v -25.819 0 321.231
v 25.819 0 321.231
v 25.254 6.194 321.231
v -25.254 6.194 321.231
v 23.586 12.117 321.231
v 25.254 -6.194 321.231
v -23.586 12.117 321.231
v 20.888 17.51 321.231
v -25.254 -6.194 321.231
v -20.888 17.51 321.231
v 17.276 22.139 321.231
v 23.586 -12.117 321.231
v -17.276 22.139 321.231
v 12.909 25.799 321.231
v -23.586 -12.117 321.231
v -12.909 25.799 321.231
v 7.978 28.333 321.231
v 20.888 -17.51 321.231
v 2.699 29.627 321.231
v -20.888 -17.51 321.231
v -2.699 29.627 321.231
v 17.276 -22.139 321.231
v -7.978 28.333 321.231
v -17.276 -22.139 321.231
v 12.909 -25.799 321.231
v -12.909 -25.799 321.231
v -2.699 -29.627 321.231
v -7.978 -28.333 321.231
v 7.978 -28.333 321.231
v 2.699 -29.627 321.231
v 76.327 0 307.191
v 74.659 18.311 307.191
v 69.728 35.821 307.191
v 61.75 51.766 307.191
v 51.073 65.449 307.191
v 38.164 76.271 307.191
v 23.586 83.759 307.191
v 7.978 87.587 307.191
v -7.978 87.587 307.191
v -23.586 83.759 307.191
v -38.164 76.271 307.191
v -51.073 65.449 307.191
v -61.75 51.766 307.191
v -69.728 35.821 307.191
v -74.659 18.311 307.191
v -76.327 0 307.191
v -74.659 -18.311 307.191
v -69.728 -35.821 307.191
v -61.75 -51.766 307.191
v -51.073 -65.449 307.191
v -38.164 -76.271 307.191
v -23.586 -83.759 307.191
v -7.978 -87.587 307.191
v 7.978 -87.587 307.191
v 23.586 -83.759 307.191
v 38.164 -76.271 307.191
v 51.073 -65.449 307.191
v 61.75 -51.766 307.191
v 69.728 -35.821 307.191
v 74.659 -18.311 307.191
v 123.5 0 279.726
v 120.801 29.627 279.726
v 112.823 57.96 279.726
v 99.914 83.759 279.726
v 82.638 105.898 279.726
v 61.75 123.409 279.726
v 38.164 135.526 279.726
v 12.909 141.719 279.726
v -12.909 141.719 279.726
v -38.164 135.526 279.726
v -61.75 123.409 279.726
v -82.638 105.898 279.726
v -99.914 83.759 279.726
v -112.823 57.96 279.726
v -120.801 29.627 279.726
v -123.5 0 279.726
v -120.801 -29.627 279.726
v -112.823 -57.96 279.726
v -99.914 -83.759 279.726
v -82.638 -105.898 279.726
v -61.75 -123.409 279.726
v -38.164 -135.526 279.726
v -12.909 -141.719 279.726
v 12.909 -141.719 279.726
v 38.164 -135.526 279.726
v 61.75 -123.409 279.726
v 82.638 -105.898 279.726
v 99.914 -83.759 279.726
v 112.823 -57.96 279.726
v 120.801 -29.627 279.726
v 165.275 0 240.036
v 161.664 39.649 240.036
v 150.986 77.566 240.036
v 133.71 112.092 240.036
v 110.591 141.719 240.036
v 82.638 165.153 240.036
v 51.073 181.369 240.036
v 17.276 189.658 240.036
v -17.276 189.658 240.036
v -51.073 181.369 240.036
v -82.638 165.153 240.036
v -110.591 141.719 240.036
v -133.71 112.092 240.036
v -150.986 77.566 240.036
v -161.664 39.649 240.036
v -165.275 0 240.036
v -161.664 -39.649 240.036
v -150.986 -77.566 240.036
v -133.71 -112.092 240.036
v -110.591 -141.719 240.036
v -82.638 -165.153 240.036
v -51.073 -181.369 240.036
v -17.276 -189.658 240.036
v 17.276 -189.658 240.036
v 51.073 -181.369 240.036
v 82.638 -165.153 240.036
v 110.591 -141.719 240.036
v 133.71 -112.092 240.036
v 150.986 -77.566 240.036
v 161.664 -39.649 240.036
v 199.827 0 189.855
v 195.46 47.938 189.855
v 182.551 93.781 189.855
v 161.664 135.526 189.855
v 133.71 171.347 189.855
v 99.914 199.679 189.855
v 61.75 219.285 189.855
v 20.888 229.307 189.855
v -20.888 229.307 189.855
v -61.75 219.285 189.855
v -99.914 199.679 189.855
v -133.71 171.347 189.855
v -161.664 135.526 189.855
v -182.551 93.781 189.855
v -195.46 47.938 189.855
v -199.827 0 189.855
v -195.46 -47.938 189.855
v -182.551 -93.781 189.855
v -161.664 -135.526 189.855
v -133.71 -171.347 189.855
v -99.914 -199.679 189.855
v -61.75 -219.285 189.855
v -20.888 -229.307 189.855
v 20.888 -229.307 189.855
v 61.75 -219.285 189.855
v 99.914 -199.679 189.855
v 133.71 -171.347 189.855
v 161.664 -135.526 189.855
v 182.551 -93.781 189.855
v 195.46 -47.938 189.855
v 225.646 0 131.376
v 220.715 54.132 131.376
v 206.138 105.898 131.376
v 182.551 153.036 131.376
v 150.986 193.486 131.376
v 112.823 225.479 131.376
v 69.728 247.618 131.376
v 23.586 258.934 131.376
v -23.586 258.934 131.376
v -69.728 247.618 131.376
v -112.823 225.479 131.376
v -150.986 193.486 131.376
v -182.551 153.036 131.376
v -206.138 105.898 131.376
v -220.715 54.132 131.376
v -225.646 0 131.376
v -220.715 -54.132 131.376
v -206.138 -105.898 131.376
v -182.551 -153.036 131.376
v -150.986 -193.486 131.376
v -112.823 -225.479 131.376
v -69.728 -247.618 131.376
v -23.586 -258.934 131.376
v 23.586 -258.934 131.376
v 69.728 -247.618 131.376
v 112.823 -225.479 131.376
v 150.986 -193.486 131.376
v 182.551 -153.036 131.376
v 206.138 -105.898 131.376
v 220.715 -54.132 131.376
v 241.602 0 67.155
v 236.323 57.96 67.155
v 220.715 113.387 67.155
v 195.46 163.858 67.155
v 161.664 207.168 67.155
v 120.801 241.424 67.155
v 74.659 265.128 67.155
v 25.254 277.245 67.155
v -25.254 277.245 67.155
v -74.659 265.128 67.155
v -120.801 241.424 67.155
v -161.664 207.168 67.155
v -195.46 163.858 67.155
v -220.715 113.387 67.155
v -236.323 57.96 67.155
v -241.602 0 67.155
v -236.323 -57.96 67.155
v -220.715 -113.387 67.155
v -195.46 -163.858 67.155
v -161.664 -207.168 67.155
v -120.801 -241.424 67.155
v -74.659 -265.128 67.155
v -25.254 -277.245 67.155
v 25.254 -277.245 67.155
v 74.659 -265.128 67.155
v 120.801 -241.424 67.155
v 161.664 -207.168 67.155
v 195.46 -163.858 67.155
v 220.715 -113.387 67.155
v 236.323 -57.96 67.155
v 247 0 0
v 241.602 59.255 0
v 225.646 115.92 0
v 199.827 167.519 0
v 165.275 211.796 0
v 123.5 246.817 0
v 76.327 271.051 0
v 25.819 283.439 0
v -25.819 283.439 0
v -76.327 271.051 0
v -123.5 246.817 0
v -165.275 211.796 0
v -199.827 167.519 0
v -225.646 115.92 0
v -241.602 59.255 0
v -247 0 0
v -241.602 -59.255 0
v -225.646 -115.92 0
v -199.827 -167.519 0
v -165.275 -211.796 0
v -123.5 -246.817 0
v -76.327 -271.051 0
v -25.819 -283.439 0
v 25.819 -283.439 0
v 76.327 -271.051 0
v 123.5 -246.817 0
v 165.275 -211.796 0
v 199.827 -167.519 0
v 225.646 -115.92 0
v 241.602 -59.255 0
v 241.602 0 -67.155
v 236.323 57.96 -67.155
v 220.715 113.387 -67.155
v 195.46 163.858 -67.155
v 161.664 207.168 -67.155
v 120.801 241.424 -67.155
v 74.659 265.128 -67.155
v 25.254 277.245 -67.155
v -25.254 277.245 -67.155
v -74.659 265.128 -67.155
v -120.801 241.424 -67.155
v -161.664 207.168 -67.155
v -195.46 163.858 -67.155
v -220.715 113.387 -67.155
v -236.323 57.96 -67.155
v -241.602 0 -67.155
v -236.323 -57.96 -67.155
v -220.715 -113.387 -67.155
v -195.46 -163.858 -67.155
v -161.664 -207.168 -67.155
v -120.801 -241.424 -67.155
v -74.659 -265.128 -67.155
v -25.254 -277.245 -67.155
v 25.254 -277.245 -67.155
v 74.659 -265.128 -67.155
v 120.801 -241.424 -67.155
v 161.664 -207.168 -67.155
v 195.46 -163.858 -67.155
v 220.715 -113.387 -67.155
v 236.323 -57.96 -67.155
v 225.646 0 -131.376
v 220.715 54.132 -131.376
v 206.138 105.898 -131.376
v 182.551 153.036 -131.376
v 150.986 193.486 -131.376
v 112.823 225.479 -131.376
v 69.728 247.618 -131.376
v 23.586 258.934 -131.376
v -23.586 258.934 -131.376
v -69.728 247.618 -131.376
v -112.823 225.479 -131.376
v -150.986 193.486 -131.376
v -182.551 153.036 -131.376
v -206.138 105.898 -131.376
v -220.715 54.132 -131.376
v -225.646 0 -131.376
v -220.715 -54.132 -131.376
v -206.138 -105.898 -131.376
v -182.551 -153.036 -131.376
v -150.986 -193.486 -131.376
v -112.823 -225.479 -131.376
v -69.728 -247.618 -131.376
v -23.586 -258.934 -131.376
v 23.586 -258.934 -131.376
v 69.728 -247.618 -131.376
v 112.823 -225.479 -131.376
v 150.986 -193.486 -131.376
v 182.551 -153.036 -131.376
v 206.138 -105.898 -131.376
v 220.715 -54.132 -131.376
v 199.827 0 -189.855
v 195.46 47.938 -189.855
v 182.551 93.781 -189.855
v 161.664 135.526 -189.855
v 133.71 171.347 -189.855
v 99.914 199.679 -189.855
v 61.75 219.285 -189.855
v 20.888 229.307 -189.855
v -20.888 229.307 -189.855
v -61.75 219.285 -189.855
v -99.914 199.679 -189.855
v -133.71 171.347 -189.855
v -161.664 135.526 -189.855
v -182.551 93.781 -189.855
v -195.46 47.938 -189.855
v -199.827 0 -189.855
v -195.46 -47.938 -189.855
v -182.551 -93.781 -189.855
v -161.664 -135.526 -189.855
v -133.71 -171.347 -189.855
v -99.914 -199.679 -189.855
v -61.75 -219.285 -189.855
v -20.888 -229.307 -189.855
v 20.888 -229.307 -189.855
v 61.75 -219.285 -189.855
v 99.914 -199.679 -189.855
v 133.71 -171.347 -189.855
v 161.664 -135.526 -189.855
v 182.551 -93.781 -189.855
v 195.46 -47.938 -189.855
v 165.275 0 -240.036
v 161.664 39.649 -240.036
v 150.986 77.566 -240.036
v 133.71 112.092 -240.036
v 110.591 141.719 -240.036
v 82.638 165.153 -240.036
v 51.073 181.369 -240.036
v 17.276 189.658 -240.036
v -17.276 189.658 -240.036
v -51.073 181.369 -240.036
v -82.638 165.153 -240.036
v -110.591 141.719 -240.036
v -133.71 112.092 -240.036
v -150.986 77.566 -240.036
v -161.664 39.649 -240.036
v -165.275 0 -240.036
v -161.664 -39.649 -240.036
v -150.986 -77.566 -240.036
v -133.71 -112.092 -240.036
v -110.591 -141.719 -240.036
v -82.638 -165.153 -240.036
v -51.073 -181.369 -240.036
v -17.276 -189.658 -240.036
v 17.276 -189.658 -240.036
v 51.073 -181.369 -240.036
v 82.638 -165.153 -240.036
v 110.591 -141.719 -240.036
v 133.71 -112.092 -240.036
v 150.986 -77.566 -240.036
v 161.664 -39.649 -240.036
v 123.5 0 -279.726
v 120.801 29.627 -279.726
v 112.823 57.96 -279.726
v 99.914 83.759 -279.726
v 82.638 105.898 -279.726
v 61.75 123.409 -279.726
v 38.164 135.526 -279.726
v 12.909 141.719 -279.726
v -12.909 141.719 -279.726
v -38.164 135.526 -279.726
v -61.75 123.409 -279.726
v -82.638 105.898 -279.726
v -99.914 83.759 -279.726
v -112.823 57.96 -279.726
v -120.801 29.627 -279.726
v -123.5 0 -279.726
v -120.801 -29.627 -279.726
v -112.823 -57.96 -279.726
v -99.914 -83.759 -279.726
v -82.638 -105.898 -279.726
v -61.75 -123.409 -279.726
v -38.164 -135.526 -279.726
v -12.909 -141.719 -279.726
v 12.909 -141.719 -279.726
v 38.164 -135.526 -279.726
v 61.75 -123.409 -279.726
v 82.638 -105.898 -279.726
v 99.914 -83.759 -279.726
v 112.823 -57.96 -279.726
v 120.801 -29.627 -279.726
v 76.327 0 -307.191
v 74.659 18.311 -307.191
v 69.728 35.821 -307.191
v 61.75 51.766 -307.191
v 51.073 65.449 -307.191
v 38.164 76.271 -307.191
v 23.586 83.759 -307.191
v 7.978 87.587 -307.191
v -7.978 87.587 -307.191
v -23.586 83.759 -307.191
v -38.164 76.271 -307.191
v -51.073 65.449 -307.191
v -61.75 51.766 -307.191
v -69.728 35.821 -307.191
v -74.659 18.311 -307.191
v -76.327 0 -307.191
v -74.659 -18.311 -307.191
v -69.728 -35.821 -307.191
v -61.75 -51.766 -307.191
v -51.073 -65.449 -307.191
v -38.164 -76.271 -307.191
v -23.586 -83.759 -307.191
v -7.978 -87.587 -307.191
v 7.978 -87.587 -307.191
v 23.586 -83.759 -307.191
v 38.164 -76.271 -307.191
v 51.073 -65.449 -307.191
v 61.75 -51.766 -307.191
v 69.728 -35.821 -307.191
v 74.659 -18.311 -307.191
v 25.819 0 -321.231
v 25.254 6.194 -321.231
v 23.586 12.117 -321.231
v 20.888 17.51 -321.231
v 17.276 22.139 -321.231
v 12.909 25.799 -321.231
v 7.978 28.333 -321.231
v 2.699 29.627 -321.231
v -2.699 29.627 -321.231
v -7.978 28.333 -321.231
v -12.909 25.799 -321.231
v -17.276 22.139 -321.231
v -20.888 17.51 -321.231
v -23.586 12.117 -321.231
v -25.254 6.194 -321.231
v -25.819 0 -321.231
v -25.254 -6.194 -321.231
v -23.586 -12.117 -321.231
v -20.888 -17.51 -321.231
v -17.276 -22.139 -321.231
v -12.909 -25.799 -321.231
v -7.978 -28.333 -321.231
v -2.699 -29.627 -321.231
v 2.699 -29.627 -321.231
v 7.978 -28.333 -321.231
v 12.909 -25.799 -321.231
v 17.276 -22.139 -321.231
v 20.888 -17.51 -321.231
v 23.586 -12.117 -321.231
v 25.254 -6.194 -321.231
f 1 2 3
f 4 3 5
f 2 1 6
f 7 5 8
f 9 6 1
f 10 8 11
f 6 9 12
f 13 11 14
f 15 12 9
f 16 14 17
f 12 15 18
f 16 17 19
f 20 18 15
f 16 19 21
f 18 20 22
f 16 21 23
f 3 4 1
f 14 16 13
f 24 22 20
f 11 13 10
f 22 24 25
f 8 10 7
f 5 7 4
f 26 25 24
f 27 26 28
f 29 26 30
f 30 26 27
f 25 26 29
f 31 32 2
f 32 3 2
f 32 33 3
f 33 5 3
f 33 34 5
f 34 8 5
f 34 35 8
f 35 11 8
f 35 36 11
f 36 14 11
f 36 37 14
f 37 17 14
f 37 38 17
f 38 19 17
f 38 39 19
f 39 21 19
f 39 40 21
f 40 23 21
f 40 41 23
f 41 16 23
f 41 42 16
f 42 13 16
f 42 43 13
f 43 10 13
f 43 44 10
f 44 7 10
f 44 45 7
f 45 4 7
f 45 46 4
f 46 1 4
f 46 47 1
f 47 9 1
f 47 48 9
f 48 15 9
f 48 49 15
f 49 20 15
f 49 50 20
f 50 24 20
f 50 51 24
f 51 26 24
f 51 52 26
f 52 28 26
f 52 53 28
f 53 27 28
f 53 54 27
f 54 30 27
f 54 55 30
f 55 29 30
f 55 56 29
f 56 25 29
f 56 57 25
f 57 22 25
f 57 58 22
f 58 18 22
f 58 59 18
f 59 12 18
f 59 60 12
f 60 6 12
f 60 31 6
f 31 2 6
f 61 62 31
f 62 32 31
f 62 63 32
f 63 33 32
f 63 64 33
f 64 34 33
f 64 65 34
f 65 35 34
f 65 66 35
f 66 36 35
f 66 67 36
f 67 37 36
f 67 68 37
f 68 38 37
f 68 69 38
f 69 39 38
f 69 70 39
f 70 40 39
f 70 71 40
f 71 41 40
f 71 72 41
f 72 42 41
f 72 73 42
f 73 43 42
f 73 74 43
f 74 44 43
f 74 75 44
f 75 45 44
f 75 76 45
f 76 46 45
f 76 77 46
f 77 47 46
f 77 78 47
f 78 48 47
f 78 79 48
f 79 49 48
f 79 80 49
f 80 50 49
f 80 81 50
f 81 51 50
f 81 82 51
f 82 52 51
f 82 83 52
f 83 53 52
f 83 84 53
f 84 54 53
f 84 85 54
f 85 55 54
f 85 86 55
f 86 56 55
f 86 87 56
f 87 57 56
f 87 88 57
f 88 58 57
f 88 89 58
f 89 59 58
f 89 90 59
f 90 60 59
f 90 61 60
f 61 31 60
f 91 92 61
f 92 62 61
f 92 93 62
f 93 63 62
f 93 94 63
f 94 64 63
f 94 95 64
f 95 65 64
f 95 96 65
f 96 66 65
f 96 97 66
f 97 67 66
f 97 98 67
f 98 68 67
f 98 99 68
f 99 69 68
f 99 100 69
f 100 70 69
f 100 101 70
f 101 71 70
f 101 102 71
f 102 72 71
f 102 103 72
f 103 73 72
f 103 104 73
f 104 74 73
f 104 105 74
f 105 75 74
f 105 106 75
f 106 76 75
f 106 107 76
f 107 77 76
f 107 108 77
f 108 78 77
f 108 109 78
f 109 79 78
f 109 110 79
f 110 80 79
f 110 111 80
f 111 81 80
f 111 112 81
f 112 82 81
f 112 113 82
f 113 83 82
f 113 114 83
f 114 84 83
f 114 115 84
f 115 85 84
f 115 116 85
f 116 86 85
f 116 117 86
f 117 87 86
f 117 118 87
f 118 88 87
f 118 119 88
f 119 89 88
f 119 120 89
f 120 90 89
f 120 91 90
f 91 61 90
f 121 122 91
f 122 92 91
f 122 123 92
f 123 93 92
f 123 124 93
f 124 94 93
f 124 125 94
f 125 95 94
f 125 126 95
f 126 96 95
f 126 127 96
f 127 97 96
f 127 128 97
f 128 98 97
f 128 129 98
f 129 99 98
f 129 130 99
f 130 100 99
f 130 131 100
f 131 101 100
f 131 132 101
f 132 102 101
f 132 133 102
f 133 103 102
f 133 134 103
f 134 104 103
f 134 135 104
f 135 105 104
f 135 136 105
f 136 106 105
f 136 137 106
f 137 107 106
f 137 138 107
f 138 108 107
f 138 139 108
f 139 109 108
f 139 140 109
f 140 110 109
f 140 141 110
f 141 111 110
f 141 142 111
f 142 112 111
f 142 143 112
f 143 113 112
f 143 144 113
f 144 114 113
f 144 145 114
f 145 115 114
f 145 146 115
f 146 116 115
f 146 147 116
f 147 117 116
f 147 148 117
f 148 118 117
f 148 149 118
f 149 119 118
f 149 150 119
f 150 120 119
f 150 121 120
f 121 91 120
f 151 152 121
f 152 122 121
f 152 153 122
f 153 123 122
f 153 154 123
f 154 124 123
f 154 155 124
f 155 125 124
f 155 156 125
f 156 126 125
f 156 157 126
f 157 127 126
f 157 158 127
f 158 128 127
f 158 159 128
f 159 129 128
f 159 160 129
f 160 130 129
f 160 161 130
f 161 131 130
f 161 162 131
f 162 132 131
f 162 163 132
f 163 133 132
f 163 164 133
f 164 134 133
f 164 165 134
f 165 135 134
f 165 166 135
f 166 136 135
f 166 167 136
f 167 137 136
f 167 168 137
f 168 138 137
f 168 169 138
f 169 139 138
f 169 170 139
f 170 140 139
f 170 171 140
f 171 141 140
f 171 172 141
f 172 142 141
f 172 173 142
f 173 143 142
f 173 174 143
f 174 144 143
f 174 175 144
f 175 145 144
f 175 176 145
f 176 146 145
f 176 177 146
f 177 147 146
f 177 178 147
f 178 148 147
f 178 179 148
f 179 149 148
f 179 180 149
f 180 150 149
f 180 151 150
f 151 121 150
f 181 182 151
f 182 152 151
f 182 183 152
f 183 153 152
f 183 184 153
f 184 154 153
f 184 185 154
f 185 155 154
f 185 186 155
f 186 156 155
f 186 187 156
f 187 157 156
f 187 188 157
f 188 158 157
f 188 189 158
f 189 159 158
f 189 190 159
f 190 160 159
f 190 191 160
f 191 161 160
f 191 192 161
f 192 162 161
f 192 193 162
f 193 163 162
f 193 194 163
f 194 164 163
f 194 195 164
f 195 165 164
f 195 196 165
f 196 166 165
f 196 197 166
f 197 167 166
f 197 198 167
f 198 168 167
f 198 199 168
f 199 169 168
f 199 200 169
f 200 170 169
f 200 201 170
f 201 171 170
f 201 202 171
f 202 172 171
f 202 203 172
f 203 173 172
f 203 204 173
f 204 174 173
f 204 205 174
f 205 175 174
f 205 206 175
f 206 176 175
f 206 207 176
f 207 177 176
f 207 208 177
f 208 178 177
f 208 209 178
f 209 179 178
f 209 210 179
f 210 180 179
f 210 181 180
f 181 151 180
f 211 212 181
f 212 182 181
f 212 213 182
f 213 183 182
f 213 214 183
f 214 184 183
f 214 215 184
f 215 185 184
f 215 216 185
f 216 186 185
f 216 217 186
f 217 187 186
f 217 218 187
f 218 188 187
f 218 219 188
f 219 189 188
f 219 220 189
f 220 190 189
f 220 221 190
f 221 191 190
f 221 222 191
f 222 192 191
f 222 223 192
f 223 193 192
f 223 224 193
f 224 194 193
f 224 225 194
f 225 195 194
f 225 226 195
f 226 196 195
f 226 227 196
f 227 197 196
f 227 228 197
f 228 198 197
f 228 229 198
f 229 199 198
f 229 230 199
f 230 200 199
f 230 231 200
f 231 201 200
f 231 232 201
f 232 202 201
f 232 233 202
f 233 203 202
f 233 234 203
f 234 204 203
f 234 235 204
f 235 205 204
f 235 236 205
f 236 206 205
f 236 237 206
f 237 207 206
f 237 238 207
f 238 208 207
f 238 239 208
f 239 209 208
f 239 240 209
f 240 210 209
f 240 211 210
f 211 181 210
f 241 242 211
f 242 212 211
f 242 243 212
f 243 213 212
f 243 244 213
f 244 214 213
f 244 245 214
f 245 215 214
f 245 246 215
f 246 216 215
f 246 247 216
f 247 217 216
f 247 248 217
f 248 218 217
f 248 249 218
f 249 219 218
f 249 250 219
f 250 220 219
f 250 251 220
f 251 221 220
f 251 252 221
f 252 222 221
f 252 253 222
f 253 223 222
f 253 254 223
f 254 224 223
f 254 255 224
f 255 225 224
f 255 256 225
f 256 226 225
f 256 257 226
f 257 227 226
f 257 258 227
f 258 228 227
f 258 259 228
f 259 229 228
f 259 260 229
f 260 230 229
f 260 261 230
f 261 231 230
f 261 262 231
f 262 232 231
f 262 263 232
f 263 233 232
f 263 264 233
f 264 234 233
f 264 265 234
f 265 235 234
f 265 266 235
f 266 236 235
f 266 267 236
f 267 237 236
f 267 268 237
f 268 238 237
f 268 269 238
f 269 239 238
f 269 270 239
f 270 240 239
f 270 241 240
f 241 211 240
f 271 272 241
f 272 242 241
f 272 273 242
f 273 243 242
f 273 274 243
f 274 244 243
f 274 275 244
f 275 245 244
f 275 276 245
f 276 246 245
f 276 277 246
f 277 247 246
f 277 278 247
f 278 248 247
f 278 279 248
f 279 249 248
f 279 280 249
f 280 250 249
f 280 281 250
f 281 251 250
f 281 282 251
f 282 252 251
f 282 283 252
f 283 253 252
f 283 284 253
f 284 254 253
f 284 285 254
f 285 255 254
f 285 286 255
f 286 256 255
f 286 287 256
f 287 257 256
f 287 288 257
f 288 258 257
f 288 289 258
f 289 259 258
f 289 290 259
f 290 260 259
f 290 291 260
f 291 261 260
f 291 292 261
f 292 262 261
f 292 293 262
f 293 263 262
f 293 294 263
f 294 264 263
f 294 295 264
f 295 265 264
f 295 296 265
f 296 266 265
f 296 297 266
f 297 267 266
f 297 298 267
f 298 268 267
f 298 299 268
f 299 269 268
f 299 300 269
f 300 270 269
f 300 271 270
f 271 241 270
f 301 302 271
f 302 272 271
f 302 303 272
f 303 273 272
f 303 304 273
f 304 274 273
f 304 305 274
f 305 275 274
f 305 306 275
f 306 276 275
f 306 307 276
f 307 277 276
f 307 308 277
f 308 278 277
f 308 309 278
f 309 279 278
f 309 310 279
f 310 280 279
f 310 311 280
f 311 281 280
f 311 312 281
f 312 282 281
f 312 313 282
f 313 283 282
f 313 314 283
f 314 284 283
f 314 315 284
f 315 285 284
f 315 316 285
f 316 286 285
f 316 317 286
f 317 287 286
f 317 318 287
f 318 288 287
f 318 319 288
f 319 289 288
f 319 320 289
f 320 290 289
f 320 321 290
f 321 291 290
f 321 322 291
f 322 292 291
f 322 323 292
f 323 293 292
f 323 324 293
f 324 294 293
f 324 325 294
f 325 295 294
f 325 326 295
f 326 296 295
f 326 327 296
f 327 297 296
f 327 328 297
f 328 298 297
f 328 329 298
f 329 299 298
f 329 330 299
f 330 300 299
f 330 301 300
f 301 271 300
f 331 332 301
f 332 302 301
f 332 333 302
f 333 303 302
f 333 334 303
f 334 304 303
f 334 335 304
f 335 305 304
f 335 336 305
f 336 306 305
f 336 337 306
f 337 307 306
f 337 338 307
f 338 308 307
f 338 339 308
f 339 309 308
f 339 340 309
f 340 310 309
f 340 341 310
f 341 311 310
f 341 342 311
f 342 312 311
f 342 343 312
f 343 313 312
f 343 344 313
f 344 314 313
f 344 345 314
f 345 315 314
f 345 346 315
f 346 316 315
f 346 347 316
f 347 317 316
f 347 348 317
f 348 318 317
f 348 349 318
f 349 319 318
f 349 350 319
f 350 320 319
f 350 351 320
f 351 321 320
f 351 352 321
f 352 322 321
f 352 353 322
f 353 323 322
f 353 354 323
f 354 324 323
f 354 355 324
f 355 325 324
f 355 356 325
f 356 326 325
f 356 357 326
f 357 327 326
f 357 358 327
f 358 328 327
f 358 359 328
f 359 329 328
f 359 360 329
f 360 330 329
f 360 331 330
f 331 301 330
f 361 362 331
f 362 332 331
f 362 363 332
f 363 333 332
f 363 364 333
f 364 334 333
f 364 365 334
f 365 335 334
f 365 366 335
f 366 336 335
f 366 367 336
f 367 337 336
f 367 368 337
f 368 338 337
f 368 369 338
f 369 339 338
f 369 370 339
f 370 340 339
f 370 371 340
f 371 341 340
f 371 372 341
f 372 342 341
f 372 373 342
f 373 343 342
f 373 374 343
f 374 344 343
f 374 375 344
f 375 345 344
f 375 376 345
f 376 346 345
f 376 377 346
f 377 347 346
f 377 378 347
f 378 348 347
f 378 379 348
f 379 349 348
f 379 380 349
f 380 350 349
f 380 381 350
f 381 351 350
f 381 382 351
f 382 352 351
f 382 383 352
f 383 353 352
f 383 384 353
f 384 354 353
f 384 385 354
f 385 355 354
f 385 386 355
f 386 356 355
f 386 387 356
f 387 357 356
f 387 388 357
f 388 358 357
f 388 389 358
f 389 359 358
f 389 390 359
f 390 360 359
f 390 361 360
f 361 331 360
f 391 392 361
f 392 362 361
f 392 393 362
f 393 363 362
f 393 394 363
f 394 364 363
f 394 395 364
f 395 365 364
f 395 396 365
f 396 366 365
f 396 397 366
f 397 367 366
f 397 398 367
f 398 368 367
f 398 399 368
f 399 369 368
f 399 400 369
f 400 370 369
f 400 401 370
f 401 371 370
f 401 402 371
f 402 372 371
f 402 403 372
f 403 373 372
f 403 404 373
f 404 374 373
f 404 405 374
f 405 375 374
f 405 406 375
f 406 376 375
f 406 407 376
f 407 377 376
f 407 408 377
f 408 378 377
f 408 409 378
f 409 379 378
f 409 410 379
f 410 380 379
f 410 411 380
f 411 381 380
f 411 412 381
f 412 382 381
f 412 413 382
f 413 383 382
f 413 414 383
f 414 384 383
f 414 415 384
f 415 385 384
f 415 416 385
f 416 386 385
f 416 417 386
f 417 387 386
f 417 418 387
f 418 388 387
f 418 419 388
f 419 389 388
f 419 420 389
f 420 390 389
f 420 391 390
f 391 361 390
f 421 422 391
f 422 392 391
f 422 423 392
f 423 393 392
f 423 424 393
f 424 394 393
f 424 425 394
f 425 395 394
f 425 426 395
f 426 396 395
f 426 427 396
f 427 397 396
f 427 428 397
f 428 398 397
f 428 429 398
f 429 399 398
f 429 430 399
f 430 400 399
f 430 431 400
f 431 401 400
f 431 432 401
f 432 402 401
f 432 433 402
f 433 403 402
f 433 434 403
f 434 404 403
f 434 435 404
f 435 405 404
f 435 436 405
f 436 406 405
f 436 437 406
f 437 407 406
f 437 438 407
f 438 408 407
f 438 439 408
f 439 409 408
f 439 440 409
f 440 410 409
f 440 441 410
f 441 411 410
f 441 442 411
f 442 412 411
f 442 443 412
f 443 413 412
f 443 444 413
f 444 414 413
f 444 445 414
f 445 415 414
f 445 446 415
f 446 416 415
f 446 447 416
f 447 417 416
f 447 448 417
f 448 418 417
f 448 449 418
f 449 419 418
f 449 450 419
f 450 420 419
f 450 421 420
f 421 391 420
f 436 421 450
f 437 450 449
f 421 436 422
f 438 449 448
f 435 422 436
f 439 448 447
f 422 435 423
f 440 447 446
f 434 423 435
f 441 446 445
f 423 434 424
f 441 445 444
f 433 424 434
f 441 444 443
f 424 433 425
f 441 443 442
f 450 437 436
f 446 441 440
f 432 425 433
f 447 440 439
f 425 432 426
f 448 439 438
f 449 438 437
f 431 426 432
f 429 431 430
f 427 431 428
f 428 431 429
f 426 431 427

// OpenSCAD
// Generated by SolidPython 1.0.1 on 2020-07-29 00:46:51


scale(v = [13, 15, 17]) {
	sphere(r = 19);
}
/***********************************************
*********      SolidPython code:      **********
************************************************
 
# import packages: SolidPython
from solid import *
from solid.utils import *
from itertools import chain, combinations, permutations


class Resize:

    def __init__(self, scad_file):
        self.scad_file = scad_file
        #self.scad_file = import_scad(scad_file)
        # cone/cylinder param:
        self.r1 = 0
        self.r2 = 0
        self.h = 0
        # rectangular prism param:
        self.w = 0
        self.l = 0
        # ellipse param:
        self.r = 0

    # import OpenScad code (file name corresponds to shape)


    # classify shape + parameters
    def assign(self, param1, param2, param3):
        if self.scad_file == 'cone.scad':
            self.r1 = param1
            self.r2 = param2
            self.h = param3
        elif self.scad_file == 'cylinder.scad':
            self.r1 = param1
            self.r2 = param2
            self.h = param3
        elif self.scad_file == 'rectangularPrism.scad':
            self.h = param1
            self.l = param2
            self.w = param3
        else:
            self.r = param1
            self.h = param2

    # resize parameters
    def iterate(self):
        x = range(3, 20, 2)
        i = 1
        if self.scad_file == 'cone.scad':
            tempList = list(permutations(x, 2))
            for temp in tempList:
                param1 = temp[0]
                param2 = temp[1]
                filepath = 'produced_scad_files/' + 'cone' + str(param1) + '_' + str(param2) + '_' + '.scad'
                scad_render_to_file(cylinder(h=param1, r1=param2, r2=0), filepath)

        elif self.scad_file == 'cylinder.scad':
            tempList = list(permutations(x, 3))
            for temp in tempList:
                param1 = temp[0]
                param2 = temp[1]
                filepath = 'produced_scad_files/' + 'cylinder' + str(param1) + '_' + str(param2) + '_' + '.scad'
                scad_render_to_file(cylinder(h=param1, r1=param2, r2=param2), filepath)

        elif self.scad_file == 'rectangularPrism.scad':
            tempList = list(permutations(x, 3))
            for temp in tempList:
                param1 = temp[0]
                param2 = temp[1]
                param3 = temp[2]
                filepath = 'produced_scad_files/' + 'rectangularPrism' + str(param1) + '_' + str(param2) + '_' + str(
                    param3) + '.scad'
                scad_render_to_file(cube(size=(param1, param2, param3)), filepath)

        elif self.scad_file == 'ellipse.scad':
            tempList = list(permutations(x, 4))
            for temp in tempList:
                param1 = temp[0]
                param2 = temp[1]
                param3 = temp[2]
                param4 = temp[3]
                filepath = 'produced_scad_files/' + 'ellipse' + str(param1) + '_' + str(param2) + '_' + str(param3) + '_' + str(param4) + '.scad'
                scad_render_to_file(scale([param1, param2, param3])(sphere(r=param4)), filepath)

    def render_to_scadfile(self):
        scad_render_to_file(scad, 'example.scad') 
 
************************************************/
